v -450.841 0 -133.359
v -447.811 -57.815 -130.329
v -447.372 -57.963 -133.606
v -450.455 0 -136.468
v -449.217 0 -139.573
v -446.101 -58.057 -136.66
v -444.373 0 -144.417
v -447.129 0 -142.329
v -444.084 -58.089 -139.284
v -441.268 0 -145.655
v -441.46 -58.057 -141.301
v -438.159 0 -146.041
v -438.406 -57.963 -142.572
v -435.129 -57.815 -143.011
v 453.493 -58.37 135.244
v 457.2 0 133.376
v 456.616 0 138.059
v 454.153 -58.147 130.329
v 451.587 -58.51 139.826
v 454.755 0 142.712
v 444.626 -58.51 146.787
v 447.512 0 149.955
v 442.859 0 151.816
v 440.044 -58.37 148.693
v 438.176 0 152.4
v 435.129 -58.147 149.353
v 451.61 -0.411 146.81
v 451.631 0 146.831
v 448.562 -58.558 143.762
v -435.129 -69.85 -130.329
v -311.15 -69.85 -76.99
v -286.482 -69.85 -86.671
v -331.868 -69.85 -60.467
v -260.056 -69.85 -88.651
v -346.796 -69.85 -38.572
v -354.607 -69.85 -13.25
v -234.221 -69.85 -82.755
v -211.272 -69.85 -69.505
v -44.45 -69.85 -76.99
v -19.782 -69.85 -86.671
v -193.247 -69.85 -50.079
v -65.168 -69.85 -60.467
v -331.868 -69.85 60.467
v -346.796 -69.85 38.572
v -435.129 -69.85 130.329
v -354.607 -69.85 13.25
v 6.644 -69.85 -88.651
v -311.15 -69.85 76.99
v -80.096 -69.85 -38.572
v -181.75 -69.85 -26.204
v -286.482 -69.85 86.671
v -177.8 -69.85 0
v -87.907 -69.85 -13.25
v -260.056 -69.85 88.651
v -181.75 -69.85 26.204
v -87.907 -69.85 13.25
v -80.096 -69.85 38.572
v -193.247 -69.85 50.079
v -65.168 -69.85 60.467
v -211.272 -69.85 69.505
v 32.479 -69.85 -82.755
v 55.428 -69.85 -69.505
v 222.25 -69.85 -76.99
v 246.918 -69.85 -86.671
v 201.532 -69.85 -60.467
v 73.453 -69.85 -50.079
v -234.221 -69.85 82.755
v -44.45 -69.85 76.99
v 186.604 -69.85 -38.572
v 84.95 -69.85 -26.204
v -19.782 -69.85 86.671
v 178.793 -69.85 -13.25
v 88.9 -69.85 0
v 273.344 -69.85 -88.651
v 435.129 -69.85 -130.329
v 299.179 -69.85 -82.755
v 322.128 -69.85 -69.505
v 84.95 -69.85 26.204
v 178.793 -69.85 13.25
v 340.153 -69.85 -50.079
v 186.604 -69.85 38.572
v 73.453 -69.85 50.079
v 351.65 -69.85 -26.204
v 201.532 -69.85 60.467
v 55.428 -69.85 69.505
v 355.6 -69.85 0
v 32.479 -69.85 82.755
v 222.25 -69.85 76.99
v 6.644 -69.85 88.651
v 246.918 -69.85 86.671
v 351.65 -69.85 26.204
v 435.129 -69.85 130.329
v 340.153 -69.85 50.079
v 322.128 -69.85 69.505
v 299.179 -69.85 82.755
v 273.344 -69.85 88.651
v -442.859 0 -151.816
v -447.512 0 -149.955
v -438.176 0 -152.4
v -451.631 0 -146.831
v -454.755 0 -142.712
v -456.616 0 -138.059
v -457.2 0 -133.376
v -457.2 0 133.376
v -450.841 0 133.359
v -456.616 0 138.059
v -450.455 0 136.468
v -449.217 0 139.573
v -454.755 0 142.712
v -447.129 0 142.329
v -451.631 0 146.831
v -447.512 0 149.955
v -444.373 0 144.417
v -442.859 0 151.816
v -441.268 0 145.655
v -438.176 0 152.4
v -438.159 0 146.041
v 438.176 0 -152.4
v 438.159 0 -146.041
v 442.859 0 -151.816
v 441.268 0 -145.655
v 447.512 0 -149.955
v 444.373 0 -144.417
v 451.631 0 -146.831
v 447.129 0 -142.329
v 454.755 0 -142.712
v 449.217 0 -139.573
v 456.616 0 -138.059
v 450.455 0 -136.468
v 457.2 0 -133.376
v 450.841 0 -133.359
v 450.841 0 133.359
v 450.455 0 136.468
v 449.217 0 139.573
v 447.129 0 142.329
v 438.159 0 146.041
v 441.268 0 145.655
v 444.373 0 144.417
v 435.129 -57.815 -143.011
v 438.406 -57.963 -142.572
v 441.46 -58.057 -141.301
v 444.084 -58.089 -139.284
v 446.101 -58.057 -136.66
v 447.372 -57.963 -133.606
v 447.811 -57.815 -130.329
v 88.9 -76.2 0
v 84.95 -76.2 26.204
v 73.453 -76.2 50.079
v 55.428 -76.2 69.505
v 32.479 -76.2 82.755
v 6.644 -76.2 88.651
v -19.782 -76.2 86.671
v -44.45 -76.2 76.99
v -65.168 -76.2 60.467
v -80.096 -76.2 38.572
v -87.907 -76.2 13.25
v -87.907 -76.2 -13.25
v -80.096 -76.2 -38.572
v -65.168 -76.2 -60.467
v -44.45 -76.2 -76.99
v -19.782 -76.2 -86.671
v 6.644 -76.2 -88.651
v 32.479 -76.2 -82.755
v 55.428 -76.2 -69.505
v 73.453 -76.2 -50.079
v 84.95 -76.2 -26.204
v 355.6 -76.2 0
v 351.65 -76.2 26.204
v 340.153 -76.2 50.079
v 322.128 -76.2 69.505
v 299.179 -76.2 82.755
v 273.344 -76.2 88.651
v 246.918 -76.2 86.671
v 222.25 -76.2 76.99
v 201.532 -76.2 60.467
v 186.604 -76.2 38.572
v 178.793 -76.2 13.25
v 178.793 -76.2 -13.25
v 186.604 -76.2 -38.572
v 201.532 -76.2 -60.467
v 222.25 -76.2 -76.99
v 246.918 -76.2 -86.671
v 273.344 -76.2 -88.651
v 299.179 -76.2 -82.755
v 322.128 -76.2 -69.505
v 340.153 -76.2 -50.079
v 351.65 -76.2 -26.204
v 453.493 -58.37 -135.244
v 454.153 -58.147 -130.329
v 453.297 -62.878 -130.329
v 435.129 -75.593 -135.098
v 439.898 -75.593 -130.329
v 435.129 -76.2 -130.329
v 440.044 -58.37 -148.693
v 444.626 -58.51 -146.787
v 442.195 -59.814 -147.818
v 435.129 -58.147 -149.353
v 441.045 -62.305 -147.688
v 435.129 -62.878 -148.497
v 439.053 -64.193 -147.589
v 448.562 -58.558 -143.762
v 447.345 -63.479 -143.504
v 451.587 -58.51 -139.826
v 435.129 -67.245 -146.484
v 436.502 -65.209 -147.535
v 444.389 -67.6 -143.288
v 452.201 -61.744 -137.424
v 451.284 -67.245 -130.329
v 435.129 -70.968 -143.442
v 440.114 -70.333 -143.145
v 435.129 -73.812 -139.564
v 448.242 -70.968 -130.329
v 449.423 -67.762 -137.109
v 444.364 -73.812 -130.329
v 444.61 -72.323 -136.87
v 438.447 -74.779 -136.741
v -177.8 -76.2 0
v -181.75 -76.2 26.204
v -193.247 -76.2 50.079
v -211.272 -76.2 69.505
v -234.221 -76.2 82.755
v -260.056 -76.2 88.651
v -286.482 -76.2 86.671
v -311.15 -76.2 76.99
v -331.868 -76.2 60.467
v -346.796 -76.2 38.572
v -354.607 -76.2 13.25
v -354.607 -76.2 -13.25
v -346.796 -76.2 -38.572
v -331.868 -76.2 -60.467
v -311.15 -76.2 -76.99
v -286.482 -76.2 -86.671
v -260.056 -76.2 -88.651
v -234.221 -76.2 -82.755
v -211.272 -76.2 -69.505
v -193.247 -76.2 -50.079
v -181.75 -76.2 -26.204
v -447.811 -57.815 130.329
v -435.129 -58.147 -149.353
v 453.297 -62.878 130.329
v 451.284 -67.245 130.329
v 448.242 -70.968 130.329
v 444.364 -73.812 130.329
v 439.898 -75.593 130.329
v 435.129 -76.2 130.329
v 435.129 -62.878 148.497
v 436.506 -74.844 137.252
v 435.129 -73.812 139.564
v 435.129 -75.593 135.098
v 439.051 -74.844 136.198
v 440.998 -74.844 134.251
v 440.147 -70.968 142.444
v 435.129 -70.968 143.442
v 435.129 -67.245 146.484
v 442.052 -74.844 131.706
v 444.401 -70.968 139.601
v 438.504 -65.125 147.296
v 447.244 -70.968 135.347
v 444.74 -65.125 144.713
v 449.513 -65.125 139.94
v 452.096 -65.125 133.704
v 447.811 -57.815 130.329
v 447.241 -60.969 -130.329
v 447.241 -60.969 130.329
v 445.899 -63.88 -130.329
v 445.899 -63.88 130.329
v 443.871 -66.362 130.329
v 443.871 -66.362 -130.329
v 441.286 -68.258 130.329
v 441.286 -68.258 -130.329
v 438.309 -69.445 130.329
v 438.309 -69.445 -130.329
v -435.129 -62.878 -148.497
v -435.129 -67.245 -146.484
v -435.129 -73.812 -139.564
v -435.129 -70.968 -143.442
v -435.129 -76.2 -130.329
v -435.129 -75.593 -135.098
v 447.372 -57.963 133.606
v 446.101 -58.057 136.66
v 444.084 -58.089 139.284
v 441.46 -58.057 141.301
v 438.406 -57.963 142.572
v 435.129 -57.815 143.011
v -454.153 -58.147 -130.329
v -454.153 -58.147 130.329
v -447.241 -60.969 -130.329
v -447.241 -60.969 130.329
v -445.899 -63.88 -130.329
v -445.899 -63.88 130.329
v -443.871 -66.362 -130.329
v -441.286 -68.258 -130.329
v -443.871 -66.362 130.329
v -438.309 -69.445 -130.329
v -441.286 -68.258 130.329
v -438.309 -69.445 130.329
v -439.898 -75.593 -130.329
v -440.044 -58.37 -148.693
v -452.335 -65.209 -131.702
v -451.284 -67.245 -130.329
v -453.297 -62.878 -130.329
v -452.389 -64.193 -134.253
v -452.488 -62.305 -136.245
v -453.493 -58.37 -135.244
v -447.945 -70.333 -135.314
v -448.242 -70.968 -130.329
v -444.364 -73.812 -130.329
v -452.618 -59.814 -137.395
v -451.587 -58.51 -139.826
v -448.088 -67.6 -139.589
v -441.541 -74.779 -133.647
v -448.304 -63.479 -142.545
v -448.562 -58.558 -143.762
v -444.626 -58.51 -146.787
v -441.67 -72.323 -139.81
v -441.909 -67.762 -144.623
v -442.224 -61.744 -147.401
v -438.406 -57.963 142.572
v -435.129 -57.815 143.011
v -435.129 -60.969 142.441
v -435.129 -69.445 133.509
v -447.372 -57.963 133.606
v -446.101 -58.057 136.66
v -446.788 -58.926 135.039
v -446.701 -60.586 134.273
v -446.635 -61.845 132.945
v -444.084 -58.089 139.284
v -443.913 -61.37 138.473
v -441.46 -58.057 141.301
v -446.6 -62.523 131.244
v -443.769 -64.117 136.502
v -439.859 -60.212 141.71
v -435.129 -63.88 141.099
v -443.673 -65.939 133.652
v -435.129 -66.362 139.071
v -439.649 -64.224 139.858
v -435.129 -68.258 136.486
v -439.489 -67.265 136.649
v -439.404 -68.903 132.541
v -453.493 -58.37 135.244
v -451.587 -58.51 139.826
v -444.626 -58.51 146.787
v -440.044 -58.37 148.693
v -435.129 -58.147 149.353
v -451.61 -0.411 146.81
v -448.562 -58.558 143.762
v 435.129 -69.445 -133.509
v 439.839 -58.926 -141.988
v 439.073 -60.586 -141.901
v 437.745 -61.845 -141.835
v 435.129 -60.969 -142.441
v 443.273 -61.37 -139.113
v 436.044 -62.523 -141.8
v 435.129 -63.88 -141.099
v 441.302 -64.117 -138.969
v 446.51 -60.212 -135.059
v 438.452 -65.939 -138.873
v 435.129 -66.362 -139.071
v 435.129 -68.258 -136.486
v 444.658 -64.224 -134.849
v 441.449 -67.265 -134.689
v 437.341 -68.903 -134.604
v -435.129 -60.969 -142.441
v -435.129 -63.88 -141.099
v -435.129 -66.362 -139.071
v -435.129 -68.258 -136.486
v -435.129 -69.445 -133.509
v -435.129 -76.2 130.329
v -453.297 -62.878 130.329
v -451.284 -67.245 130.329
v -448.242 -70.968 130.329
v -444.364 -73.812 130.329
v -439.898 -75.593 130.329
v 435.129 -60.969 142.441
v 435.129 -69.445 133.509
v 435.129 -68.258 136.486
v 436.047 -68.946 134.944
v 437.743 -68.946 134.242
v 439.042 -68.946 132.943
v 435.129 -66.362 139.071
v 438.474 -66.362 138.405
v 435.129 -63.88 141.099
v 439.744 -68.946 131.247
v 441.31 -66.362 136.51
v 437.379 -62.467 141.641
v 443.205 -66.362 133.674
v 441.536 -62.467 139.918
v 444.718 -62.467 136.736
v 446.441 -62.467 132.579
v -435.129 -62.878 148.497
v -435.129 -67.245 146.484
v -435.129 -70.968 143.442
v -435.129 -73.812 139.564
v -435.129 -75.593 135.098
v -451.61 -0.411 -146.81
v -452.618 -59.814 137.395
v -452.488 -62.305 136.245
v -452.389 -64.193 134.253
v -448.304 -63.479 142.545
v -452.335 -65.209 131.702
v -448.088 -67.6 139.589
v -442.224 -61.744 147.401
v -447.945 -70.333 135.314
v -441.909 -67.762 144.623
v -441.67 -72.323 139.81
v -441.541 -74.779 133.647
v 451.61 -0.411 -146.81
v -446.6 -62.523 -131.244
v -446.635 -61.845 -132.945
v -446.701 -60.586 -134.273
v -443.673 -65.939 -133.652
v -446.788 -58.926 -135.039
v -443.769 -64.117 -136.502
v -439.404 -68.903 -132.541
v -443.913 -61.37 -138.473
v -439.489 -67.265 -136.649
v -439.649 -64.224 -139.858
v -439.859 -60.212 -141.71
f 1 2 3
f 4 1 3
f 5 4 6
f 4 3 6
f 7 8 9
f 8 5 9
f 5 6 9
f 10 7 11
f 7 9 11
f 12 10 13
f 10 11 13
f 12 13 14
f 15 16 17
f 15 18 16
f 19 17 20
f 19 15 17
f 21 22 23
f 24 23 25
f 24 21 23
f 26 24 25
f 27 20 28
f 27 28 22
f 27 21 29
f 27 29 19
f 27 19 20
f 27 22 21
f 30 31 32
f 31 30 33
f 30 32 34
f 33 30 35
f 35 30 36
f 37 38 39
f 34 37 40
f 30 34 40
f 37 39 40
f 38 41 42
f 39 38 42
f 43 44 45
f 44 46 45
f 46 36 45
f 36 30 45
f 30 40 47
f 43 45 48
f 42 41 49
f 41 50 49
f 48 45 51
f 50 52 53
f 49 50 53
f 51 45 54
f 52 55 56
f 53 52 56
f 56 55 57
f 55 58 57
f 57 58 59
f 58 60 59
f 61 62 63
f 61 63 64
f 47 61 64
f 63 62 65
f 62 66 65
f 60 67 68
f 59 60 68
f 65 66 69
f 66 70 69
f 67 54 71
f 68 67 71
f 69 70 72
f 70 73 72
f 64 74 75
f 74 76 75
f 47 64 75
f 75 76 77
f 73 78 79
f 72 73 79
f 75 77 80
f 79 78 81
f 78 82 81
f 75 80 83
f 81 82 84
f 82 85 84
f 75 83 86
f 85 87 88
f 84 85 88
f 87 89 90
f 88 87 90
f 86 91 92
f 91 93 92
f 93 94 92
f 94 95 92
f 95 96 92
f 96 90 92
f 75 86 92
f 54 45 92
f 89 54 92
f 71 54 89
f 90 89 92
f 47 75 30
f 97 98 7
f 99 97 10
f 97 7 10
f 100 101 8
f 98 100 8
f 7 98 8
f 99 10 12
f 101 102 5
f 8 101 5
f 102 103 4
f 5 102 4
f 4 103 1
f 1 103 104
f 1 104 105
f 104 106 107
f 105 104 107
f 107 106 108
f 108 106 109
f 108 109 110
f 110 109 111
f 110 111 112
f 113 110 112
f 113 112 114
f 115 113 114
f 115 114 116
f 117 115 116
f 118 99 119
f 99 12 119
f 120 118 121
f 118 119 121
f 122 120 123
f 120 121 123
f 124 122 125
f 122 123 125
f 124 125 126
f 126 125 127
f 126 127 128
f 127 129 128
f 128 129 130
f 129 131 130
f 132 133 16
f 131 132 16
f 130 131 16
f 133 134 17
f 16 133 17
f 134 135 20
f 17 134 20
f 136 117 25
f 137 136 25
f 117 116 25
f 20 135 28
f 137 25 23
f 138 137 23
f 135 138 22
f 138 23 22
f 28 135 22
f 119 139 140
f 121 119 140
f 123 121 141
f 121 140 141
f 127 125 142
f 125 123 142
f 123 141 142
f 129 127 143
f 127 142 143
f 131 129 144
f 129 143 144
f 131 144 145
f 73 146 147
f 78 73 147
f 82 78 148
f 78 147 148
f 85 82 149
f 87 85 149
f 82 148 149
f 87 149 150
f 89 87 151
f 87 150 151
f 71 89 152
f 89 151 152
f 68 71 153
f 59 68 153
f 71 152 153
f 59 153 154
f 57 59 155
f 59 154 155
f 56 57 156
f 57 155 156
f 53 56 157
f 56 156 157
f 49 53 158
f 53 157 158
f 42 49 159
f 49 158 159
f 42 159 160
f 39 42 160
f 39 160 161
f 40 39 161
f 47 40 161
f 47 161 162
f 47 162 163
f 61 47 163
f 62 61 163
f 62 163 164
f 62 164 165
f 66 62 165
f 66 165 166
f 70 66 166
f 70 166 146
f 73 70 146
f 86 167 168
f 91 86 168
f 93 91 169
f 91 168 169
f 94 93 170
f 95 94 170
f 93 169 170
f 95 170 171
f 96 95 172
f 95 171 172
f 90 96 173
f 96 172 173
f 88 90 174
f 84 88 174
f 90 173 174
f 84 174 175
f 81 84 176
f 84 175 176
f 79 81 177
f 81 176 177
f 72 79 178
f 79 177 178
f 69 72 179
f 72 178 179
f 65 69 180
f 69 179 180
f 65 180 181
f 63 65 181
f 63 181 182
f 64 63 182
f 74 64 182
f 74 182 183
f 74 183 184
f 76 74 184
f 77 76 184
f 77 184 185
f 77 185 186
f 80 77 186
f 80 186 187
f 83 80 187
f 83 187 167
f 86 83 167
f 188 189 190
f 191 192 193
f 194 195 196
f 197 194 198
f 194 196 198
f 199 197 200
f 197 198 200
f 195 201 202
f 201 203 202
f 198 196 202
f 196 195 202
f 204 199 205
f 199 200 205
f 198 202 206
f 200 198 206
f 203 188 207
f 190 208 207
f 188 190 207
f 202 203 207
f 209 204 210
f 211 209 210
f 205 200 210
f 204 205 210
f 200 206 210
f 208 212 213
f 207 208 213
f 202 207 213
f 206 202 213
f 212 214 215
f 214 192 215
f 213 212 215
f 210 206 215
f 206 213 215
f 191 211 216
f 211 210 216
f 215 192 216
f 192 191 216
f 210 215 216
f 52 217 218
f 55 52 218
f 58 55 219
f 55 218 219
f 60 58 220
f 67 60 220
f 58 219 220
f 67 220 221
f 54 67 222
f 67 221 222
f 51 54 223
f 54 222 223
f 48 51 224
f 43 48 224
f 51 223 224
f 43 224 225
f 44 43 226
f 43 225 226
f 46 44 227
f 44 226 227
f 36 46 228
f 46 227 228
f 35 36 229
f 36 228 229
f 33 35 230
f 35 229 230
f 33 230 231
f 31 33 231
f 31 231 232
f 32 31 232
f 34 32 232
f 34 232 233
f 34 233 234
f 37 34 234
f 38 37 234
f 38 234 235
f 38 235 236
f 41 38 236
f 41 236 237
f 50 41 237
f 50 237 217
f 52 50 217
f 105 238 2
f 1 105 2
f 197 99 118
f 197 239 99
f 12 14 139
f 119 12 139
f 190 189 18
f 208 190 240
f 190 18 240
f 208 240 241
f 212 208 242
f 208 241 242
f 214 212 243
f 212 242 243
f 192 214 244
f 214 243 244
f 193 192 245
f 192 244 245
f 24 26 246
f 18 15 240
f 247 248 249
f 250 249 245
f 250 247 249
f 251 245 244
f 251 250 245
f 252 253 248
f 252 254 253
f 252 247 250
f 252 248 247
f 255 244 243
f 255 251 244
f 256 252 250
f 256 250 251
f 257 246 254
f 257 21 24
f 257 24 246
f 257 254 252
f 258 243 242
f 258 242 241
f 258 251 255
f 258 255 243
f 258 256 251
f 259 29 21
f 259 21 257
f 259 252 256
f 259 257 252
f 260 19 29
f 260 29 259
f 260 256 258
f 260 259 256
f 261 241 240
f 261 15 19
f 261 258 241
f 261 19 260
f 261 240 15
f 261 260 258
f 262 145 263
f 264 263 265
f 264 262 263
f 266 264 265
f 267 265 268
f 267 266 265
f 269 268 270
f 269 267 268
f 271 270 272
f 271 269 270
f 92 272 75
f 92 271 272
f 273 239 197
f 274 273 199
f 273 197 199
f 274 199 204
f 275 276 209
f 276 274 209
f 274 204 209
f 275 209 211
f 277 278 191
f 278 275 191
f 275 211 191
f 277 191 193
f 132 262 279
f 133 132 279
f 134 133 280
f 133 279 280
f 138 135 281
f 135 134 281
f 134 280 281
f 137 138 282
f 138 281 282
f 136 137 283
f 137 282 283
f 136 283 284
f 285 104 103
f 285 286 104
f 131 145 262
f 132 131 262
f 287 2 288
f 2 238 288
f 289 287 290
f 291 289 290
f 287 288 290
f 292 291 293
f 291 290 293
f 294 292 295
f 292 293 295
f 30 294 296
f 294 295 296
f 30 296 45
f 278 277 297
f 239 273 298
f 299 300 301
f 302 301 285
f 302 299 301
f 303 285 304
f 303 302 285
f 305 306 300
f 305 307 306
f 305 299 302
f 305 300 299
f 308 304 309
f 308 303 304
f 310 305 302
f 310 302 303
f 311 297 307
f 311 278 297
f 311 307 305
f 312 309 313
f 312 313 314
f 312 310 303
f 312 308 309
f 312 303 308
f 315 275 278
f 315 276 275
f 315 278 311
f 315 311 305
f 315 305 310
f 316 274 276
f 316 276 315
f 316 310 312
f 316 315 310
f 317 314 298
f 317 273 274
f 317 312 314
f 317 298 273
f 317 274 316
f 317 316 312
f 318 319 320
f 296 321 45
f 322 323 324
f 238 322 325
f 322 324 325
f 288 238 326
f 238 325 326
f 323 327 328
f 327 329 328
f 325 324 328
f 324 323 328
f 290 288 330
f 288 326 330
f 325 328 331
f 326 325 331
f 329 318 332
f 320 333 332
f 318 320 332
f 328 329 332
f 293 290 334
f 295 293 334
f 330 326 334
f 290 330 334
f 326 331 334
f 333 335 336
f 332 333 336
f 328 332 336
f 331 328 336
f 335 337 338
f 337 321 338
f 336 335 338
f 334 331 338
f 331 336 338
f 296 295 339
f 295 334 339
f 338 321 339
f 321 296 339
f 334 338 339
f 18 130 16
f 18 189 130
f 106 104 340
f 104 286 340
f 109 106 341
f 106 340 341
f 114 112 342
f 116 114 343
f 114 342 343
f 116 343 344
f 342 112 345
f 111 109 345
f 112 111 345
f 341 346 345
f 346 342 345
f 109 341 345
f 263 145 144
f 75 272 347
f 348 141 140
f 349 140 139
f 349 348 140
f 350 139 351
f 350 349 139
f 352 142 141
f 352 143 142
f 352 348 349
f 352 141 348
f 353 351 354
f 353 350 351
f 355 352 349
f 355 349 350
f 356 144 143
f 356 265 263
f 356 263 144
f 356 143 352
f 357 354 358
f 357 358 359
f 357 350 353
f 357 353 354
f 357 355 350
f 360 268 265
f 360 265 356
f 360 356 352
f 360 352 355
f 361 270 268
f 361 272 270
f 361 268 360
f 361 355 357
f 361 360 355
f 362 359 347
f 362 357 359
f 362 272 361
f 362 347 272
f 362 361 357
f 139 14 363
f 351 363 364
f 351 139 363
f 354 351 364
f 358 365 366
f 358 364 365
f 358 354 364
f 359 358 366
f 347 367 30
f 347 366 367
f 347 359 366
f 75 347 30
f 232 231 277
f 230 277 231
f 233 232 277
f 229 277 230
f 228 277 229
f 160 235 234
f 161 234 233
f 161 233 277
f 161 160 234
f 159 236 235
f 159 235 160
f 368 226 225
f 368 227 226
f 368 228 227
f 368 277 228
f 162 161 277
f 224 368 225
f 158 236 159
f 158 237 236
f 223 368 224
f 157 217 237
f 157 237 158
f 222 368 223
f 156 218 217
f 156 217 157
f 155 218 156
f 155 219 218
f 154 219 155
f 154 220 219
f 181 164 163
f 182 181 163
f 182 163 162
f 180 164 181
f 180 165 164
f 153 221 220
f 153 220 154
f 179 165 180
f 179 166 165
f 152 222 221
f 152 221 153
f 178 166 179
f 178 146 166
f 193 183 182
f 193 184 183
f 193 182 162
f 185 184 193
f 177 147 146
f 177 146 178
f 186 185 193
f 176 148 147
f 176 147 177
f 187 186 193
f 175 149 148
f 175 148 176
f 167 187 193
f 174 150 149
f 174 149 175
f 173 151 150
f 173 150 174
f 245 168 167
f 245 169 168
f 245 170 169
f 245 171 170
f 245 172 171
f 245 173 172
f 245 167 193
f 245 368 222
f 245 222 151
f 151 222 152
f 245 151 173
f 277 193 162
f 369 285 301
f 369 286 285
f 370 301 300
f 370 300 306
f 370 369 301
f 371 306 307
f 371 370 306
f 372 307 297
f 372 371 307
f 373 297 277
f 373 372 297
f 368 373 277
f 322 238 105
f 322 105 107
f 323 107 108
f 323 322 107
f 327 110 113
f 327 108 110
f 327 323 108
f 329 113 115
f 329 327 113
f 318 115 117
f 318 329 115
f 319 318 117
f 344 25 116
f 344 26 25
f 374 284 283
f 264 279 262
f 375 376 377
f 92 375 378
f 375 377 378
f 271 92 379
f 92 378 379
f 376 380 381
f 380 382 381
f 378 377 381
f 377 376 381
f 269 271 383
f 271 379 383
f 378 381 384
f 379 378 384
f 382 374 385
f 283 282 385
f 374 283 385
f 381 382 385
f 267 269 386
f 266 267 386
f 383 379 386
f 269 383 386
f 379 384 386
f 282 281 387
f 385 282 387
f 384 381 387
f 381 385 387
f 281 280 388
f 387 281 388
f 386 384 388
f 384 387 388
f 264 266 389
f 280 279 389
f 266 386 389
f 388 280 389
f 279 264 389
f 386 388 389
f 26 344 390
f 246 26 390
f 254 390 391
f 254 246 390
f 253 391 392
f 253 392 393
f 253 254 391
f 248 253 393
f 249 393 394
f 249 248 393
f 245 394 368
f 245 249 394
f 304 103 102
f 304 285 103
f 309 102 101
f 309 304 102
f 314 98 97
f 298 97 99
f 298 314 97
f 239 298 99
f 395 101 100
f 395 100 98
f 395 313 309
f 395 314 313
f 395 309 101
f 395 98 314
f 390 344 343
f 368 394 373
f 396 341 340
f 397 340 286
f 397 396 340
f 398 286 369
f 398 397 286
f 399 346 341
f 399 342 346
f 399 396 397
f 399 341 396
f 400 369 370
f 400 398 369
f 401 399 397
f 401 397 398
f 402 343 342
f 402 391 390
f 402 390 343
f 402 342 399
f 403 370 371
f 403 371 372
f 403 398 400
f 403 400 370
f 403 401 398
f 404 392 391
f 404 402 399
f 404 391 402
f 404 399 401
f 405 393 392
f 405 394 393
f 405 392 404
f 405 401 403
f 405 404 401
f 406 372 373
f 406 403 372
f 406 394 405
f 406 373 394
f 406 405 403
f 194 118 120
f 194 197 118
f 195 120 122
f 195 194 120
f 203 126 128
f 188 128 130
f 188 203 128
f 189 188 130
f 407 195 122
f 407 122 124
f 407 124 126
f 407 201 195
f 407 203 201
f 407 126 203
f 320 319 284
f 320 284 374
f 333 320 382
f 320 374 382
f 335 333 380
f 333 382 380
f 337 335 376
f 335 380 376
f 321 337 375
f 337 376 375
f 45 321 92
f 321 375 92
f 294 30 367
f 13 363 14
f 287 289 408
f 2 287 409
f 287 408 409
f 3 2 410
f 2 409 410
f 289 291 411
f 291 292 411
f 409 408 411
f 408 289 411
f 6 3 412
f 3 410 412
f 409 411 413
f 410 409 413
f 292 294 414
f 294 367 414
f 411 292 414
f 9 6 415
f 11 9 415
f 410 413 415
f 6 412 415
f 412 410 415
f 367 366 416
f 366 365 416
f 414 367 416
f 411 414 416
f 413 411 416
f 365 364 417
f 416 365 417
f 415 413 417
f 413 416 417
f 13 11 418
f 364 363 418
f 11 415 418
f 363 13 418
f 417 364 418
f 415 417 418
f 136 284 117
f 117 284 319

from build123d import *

# Parameters (mm, degrees)
F0_W     = 914.4
F0_H     = 304.8
F1_DEPTH = 76.2
F1_TAPER = 3
F2_R     = 19.05
F3_T     = 6.35
F4_R     = 88.9
F5_DEPTH = 76.2010001


# Not quite as in the source:
# - a shell that OpenCascade refuses in one call is made with other operations: the cavity is built on its own and cut out


with BuildPart() as f1:
    # F0 (on Front) → F1 (new body)
    with BuildSketch(Plane.XZ):
        Rectangle(F0_W, F0_H)
    extrude(amount=F1_DEPTH, taper=F1_TAPER)

    # F2
    f2_edges = [f1.edges().sort_by_distance(p)[0] for p in [
        (455.203264, -38.1, 150.403264),
        (0, -76.2, 148.406527),
        (453.206527, -76.2, 0),
        (455.203264, -38.1, -150.403264),
        (0, -76.2, -148.406527),
        (-455.203264, -38.1, 150.403264),
        (-453.206527, -76.2, 0),
        (-455.203264, -38.1, -150.403264),
    ]]
    fillet(f2_edges, radius=F2_R)

    # F3: shell of thickness 6.35, made by hand


with BuildPart() as f3_core1:
    # F3_t2: copy of F1
    add(f1.part)

    # the walls: a layer under each face that stays
    f3_faces = [f3_core1.faces().sort_by_distance(p)[0] for p in [
        (0, -29.0734999832, 150.8763224299),
        (450.0967392281, -29.2790219143, 145.2967392281),
        (-450.0967392281, -29.2790219142, 145.2967392281),
        (0, -70.9683817678, 143.4419068897),
        (455.6763224299, -29.0734999832, 0),
        (-455.6763224299, -29.0734999832, 0),
        (450.0967392281, -29.2790219142, -145.2967392281),
        (-450.0967392281, -29.2790219142, -145.2967392281),
        (0, -29.0734999832, -150.8763224299),
        (444.4011528131, -70.968381766, 139.6011528105),
        (-448.0884256524, -67.5999269998, 139.5887948951),
        (0, -76.2, 0),
        (448.2419068897, -70.9683817678, 0),
        (-448.2419068897, -70.9683817678, 0),
        (444.388794687, -67.5999269998, -143.2884258011),
        (-448.0884256897, -67.5999270772, -139.5887947556),
        (0, -70.9683817678, -143.4419068897),
    ]]
    thicken(f3_faces, amount=-F3_T, mode=Mode.SUBTRACT)


with BuildPart() as f1_1:
    add(f1.part)

    # what is left inside the walls is the cavity
    f3_cavity = [f3_core1.part.solids().sort_by_distance(p)[0] for p in [
        (29.280349, -0.0635, -87.84086),
    ]]
    add(f3_cavity, mode=Mode.SUBTRACT)

    # F4 (on face) → F5 (cut, through all)
    with BuildSketch(Plane.XZ.offset(76.2)):
        with Locations((266.7, 0)):
            Circle(F4_R)
        Circle(F4_R)
        with Locations((-266.7, 0)):
            Circle(F4_R)
    extrude(amount=-F5_DEPTH, mode=Mode.SUBTRACT)


solid = f1_1.part
